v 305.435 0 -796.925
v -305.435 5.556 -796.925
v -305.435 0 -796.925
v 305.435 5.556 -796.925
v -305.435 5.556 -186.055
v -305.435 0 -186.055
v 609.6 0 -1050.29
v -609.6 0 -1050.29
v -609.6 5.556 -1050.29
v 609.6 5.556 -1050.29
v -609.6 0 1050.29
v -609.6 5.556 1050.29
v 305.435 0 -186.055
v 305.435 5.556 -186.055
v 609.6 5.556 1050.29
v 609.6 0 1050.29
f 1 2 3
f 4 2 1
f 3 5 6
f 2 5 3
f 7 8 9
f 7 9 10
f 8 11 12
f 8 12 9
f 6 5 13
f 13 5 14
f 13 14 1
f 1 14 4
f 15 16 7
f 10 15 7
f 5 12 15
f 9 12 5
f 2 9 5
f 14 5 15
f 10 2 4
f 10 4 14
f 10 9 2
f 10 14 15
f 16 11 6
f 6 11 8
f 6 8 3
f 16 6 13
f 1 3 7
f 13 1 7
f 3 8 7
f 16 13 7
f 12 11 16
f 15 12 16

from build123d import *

# Parameters (mm, degrees)
SKETCH1_W               = 1219.2
SKETCH1_H               = 2100.58
BOSS_EXTRUDE1_DEPTH     = 5.55625
SKETCH2_W               = 610.87
SKETCH2_H               = 610.87
CUT_EXTRUDE1_DEPTH      = 1
CUT_EXTRUDE1_DEPTH_BACK = 6.55625


with BuildPart() as part:
    # Sketch1 → Boss-Extrude1 (new body)
    with BuildSketch(Plane(origin=(0, 0, 0), x_dir=(1, 0, 0), z_dir=(0, 1, 0))):
        Rectangle(SKETCH1_W, SKETCH1_H)
    extrude(amount=BOSS_EXTRUDE1_DEPTH)

    # Sketch2 → Cut-Extrude1 (cut, two sides)
    with BuildSketch(Plane(origin=(0, 5.55625, 0), x_dir=(1, 0, 0), z_dir=(0, 1, 0))) as cut_extrude1_sk:
        with Locations((0, 491.49)):
            Rectangle(SKETCH2_W, SKETCH2_H)
    extrude(amount=CUT_EXTRUDE1_DEPTH, mode=Mode.SUBTRACT)
    extrude(cut_extrude1_sk.sketch, amount=-CUT_EXTRUDE1_DEPTH_BACK, mode=Mode.SUBTRACT)


solid = part.part
